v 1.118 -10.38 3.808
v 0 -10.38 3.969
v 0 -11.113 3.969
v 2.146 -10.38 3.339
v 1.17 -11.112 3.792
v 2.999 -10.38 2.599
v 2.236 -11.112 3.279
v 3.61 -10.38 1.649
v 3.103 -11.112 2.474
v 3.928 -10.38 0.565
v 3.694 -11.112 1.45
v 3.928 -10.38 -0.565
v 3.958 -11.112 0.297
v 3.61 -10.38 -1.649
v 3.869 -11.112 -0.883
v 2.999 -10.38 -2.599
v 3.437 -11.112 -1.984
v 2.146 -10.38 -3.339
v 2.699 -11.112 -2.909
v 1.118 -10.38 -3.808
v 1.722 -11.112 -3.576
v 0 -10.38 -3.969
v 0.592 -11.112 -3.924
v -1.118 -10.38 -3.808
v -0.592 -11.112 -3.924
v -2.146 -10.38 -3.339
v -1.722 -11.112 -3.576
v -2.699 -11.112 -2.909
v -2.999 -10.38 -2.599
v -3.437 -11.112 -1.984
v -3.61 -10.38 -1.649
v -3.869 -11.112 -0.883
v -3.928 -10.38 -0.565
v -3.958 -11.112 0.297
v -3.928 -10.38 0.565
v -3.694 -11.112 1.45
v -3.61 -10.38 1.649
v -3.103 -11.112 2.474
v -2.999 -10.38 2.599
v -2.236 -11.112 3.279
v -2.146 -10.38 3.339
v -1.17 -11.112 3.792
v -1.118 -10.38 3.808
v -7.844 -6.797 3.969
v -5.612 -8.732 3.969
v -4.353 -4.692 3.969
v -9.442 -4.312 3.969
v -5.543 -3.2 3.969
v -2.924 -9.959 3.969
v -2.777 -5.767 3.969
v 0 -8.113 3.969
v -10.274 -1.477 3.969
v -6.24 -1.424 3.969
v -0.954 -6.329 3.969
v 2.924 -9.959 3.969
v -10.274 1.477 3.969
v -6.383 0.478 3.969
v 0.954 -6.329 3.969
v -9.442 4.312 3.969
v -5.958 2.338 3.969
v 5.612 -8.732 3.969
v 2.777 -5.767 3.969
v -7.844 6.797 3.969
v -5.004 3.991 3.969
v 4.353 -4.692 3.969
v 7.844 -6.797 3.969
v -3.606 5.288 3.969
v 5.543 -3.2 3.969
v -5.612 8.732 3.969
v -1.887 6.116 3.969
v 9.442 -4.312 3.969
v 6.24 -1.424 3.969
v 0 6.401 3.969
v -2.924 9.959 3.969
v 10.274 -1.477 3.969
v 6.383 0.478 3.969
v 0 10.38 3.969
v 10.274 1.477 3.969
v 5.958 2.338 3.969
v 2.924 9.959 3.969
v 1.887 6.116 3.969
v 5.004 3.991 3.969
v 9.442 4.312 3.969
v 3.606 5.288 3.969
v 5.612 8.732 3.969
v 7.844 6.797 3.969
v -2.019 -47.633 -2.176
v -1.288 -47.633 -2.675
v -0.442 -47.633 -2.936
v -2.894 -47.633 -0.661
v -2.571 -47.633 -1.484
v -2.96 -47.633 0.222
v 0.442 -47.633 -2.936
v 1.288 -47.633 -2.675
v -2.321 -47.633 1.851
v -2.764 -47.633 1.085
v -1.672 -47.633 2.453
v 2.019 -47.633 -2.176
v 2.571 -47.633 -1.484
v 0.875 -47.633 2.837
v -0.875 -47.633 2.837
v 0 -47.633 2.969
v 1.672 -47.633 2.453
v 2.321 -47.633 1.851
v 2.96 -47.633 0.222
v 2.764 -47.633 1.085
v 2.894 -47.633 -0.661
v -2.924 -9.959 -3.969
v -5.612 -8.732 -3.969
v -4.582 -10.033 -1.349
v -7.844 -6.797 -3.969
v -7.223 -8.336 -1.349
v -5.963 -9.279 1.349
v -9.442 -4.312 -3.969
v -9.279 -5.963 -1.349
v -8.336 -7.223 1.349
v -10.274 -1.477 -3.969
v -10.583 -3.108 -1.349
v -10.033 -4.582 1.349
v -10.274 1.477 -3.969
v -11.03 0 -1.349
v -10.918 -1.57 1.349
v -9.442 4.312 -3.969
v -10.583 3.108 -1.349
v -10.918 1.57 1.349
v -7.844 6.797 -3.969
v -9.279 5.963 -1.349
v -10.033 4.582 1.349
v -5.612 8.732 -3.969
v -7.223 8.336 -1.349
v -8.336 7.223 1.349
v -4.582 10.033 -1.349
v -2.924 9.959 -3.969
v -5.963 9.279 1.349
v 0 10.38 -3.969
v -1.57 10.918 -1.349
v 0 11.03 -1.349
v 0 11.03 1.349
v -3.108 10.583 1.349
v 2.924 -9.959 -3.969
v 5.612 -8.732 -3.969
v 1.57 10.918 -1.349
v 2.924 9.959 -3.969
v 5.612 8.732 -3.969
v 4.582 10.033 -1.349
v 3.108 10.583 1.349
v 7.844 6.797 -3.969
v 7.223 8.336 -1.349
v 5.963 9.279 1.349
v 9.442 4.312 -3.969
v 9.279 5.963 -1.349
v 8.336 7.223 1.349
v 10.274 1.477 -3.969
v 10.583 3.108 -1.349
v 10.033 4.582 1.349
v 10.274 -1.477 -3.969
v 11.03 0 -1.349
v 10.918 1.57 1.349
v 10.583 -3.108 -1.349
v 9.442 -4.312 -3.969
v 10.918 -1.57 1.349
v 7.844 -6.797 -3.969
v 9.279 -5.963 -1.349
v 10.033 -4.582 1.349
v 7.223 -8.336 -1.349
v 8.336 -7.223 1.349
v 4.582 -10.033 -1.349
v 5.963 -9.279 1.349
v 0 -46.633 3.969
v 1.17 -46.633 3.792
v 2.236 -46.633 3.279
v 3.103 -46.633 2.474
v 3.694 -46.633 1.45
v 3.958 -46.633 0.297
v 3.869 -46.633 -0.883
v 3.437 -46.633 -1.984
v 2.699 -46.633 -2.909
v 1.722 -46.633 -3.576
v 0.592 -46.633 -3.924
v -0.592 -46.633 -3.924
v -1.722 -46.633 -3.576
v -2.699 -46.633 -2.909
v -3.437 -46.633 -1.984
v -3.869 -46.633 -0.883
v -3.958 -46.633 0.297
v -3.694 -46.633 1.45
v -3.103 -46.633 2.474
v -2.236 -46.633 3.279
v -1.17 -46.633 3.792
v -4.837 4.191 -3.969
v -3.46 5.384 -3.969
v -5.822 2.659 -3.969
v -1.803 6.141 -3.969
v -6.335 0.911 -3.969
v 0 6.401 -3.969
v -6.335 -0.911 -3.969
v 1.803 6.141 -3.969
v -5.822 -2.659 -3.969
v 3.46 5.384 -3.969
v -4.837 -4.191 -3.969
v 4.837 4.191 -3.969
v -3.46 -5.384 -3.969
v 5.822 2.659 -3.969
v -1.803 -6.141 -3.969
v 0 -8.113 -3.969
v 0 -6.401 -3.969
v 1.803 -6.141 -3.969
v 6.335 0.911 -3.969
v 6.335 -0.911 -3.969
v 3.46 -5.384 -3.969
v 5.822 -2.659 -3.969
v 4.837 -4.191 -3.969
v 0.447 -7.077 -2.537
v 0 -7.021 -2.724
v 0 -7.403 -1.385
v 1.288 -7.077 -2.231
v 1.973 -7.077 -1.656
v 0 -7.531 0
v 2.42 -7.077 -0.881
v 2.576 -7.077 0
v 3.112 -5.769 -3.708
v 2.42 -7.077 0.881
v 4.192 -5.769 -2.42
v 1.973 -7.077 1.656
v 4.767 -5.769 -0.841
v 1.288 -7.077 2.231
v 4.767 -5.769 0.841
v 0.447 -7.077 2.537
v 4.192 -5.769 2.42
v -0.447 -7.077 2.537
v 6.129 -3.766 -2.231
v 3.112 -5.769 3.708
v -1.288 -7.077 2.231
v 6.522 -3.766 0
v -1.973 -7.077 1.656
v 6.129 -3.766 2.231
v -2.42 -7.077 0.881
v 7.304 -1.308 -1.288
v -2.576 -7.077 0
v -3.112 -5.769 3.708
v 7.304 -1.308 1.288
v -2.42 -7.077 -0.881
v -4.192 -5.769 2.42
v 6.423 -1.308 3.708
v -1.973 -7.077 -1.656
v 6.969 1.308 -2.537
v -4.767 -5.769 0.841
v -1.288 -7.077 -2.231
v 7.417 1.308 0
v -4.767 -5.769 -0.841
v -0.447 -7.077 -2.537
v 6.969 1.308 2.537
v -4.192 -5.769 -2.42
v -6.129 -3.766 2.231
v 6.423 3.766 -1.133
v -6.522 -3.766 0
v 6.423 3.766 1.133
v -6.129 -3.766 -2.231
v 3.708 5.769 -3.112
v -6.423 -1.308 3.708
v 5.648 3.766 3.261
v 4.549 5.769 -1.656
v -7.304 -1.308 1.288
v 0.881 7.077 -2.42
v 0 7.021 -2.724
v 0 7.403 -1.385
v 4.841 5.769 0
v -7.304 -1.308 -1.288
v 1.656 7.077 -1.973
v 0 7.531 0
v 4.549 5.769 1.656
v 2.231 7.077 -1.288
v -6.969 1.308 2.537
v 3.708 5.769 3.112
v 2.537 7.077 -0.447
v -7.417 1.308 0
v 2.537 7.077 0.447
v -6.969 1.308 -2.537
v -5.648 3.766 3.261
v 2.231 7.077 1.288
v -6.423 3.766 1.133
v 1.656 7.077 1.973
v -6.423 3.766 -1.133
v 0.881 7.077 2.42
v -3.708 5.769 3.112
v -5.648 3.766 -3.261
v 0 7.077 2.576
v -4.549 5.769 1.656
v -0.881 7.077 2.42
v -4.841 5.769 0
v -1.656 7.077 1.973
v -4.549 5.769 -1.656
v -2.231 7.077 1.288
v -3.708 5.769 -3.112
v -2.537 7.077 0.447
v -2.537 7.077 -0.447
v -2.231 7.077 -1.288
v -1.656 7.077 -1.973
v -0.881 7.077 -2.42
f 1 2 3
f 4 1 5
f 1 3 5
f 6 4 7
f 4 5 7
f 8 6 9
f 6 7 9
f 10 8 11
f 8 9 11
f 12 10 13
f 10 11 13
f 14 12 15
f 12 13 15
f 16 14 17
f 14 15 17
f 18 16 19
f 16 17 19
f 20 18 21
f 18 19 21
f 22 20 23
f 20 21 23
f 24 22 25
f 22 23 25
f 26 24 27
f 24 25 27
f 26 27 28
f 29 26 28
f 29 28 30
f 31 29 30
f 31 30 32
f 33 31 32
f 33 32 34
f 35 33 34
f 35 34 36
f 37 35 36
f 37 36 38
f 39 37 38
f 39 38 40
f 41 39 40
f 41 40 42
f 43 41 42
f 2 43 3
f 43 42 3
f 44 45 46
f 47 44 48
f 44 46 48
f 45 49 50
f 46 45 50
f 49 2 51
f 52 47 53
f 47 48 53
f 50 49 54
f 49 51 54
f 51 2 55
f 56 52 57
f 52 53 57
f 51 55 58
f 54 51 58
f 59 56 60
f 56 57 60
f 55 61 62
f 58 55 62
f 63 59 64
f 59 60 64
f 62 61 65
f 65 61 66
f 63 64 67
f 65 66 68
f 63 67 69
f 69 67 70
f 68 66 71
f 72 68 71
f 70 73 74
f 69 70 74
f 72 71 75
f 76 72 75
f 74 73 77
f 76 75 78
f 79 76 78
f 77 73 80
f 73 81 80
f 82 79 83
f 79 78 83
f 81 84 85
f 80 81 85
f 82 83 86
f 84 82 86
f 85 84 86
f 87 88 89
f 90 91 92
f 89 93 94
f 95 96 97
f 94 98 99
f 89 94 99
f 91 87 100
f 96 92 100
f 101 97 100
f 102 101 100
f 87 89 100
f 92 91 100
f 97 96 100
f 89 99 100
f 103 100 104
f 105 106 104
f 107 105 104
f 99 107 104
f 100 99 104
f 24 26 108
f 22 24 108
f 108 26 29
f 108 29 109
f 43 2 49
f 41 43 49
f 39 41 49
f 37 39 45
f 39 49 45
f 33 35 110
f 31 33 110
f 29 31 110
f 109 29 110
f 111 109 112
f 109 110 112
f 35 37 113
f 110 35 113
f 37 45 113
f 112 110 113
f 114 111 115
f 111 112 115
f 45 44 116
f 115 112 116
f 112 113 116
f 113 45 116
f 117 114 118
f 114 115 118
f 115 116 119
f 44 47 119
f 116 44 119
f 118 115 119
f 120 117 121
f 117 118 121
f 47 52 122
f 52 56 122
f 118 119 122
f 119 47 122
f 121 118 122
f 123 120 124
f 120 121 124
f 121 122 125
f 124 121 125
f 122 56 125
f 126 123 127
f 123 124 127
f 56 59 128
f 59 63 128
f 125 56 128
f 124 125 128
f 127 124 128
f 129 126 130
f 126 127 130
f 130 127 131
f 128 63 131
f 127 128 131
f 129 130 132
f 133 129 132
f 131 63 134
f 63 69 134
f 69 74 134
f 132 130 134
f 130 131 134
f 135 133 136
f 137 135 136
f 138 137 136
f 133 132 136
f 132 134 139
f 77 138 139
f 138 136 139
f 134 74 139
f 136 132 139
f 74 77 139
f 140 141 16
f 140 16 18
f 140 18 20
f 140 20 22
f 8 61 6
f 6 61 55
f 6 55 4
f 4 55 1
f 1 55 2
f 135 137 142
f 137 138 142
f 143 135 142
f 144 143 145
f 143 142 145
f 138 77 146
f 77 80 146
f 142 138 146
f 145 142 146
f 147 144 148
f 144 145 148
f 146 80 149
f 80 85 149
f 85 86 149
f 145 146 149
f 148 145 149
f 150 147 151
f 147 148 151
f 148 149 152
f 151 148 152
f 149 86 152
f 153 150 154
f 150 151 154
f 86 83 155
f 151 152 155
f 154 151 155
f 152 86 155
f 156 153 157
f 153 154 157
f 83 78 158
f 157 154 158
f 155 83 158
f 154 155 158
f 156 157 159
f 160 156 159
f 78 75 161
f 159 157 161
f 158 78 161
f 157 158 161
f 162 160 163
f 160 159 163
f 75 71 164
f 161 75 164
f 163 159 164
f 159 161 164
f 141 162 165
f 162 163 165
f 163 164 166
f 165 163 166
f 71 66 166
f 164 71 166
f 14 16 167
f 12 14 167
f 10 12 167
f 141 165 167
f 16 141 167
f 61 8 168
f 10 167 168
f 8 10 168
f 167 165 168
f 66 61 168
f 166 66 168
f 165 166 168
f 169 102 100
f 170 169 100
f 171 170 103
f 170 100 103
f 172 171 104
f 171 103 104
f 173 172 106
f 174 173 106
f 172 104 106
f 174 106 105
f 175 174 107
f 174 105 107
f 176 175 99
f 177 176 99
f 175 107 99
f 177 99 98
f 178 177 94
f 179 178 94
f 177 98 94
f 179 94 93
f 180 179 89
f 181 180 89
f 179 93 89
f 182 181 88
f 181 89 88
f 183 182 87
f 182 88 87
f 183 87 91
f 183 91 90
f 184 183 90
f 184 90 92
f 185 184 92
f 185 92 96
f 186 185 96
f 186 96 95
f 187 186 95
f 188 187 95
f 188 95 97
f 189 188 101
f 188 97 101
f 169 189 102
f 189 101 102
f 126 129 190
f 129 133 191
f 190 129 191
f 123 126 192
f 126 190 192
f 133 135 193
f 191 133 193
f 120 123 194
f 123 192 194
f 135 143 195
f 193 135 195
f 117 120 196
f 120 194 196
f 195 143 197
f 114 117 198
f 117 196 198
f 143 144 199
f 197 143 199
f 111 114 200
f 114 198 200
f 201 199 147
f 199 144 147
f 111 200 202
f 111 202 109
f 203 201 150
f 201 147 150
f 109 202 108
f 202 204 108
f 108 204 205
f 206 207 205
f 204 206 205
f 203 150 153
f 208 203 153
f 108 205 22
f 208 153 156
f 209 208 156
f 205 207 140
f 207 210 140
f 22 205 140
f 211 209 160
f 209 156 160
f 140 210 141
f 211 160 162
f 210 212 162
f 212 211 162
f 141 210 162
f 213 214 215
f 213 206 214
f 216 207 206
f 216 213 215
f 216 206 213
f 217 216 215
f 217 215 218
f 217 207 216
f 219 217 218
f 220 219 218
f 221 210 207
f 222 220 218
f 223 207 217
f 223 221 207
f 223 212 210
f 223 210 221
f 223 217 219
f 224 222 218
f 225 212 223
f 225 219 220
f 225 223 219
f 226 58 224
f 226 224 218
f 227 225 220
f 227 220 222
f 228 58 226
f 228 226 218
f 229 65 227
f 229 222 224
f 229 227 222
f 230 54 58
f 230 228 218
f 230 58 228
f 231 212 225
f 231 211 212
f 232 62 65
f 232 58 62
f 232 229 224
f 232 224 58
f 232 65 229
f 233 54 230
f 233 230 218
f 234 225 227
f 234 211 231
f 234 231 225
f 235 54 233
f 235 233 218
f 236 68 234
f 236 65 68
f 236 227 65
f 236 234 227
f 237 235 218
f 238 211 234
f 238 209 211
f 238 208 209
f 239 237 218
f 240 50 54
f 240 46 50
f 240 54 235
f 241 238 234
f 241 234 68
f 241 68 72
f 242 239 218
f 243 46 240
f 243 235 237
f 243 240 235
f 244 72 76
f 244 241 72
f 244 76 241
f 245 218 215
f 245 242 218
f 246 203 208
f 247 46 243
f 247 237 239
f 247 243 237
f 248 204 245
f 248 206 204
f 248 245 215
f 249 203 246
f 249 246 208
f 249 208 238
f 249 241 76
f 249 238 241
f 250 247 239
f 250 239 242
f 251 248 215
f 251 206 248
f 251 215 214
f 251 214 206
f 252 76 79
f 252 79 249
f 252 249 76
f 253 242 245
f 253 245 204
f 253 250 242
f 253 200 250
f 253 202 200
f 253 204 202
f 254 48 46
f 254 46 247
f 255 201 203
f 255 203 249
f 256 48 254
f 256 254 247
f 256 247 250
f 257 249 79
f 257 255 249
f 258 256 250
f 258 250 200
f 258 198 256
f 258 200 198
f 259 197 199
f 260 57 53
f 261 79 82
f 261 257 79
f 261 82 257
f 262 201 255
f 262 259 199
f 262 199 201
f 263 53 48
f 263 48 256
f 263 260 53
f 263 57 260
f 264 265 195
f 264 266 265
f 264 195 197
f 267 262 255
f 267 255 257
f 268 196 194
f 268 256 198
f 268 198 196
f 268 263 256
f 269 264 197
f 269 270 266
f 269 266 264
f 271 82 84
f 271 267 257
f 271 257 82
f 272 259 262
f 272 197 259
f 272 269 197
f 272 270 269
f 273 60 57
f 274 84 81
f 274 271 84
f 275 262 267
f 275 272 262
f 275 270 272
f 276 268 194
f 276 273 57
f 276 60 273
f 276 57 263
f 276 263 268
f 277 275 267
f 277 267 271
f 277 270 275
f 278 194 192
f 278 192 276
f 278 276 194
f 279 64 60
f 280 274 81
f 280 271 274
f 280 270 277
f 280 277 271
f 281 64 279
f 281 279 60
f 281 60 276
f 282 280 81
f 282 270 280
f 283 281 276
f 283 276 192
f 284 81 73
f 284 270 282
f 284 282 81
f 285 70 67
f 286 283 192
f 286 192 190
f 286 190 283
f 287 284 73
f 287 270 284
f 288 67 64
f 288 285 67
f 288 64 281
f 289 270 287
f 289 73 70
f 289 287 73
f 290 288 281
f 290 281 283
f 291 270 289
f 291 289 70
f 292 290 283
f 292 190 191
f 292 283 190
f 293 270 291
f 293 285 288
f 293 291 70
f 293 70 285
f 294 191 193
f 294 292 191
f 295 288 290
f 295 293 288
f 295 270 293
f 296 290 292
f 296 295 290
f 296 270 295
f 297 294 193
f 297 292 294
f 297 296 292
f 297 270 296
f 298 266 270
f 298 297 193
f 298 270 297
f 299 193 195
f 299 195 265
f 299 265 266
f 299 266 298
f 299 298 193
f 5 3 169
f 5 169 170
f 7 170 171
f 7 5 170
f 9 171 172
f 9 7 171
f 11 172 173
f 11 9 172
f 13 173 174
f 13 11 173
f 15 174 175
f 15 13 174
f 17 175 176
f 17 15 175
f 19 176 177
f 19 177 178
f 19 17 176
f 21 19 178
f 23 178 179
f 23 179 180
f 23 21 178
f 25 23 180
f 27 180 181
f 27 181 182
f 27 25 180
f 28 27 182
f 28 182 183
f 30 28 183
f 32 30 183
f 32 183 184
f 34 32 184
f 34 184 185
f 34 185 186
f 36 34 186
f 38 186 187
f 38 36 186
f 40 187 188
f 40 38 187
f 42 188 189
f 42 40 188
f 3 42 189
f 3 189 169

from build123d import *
from build123d.topology import SkipClean

# Parameters (mm, degrees)
SKETCH5_R           = 3.96875
EXTRUDE2_DEPTH      = 3
EXTRUDE2_DEPTH_BACK = 36.52
CHAMFER1_SIZE       = 1


with BuildPart() as part:
    # Sketch3 → Revolve2 (revolve)
    with BuildSketch(Plane(origin=(0, 0, 0), x_dir=(0, 0, -1), z_dir=(1, 0, 0))):
        with BuildLine():
            Line((-3.96875, 10.379628109), (-3.96875, 0))
            Line((-3.96875, 0), (3.96875, 0))
            Line((3.96875, 0), (3.96875, 10.379628109))
            ThreePointArc((3.96875, 10.379628109), (0, 11.1125), (-3.96875, 10.379628109))
        make_face()
    revolve(axis=Axis((0, 0, 8.146649187), (0, 0, -1)))

    # Sketch2 → Cut-Revolve2 (revolve, cut)
    with BuildSketch(Plane(origin=(0, 0, 0), x_dir=(0, 0, -1), z_dir=(1, 0, 0))):
        with BuildLine():
            Line((0, 7.5311), (0, -7.5311))
            ThreePointArc((0, -7.5311), (7.5311, 0), (0, 7.5311))
        make_face()
    revolve(axis=Axis((0, 15.474361319, 0), (0, -1, 0)), mode=Mode.SUBTRACT)

    # Sketch5 → Extrude2 (add, two sides)
    with SkipClean():  # the faces are left unmerged after this step: merging them gives an invalid solid
        with BuildSketch(Plane(origin=(0, -11.1125, 0), x_dir=(-1, 0, 0), z_dir=(0, 1, 0))) as extrude2_sk:
            with Locations(Location((0, 0, 0), (0, 0, 90))):
                Circle(SKETCH5_R)
        extrude(amount=EXTRUDE2_DEPTH)
        extrude(extrude2_sk.sketch, amount=-EXTRUDE2_DEPTH_BACK)

    # Chamfer1
    chamfer1_edges = [part.edges().sort_by_distance(p)[0] for p in [
        (0, -47.6325, -3.96875),
    ]]
    chamfer(chamfer1_edges, length=CHAMFER1_SIZE)


solid = part.part
